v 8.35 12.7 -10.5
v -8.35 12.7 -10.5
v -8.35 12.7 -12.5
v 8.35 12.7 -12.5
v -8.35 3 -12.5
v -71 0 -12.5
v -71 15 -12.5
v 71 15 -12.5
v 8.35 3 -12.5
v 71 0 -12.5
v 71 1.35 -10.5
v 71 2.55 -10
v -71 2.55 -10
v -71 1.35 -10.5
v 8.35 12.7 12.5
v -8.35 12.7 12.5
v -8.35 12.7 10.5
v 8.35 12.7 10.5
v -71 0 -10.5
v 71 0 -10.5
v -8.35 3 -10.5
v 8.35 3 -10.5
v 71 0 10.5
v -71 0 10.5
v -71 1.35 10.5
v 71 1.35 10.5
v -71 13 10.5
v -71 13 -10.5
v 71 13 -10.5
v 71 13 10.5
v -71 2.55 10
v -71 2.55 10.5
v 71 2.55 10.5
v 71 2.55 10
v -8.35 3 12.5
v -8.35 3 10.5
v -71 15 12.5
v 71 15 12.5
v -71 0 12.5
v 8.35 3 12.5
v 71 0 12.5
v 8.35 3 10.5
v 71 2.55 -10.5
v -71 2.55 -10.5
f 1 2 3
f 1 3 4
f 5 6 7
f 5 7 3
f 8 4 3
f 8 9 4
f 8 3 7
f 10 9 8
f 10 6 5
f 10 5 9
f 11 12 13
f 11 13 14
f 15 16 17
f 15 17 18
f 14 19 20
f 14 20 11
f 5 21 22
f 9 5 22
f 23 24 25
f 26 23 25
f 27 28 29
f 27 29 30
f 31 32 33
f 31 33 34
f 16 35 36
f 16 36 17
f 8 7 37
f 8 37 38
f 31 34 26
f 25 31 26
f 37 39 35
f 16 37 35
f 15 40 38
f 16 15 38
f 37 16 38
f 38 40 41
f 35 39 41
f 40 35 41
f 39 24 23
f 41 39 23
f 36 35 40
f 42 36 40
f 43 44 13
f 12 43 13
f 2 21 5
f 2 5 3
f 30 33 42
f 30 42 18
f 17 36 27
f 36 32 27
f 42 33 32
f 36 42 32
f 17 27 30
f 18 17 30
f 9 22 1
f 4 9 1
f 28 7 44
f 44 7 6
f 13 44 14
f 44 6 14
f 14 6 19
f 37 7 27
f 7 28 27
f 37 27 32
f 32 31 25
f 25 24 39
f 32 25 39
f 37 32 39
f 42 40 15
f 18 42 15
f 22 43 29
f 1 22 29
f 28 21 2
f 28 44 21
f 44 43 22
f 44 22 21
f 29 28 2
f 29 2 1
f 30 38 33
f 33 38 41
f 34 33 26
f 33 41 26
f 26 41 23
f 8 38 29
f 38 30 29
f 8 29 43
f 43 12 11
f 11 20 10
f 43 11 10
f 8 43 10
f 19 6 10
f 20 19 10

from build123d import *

# Parameters (mm, degrees)
CROQUIS1_W              = 142
CROQUIS1_H              = 20.7
CROQUIS1_H_2            = 2.15
SALIENTE_EXTRUIR1_DEPTH = 15
CROQUIS2_W              = 21
CROQUIS2_H              = 13
CORTAR_EXTRUIR1_DEPTH   = 230
SALIENTE_EXTRUIR4_DEPTH = 142
CROQUIS12_W             = 16.7
CROQUIS12_H             = 9.7
CORTAR_EXTRUIR2_DEPTH   = 50


with BuildPart() as part:
    # Croquis1 → Saliente-Extruir1 (new body)
    with BuildSketch(Plane(origin=(0, 0, 0), x_dir=(1, 0, 0), z_dir=(0, 1, 0))):
        Rectangle(CROQUIS1_W, CROQUIS1_H)
        with Locations((0, 11.425)):
            Rectangle(CROQUIS1_W, CROQUIS1_H_2)
        with Locations((0, -11.425)):
            Rectangle(CROQUIS1_W, CROQUIS1_H_2)
    extrude(amount=SALIENTE_EXTRUIR1_DEPTH)

    # Croquis2 → Cortar-Extruir1 (cut)
    with BuildSketch(Plane.ZY.offset(71)):
        with Locations((0, 6.5)):
            Rectangle(CROQUIS2_W, CROQUIS2_H)
    extrude(amount=-CORTAR_EXTRUIR1_DEPTH, mode=Mode.SUBTRACT)

    # Croquis11 → Saliente-Extruir4 (add)
    with BuildSketch(Plane.ZY.offset(71)):
        Polygon((-10.5, 1.35), (-10.5, 2.55), (-10, 2.55), align=None)
        Polygon((10, 2.55), (10.5, 1.35), (10.5, 2.55), align=None)
    extrude(amount=-SALIENTE_EXTRUIR4_DEPTH)

    # Croquis12 → Cortar-Extruir2 (cut)
    with BuildSketch(Plane.XY.offset(12.5)):
        with Locations((0, 7.85)):
            Rectangle(CROQUIS12_W, CROQUIS12_H)
    extrude(amount=-CORTAR_EXTRUIR2_DEPTH, mode=Mode.SUBTRACT)


solid = part.part
